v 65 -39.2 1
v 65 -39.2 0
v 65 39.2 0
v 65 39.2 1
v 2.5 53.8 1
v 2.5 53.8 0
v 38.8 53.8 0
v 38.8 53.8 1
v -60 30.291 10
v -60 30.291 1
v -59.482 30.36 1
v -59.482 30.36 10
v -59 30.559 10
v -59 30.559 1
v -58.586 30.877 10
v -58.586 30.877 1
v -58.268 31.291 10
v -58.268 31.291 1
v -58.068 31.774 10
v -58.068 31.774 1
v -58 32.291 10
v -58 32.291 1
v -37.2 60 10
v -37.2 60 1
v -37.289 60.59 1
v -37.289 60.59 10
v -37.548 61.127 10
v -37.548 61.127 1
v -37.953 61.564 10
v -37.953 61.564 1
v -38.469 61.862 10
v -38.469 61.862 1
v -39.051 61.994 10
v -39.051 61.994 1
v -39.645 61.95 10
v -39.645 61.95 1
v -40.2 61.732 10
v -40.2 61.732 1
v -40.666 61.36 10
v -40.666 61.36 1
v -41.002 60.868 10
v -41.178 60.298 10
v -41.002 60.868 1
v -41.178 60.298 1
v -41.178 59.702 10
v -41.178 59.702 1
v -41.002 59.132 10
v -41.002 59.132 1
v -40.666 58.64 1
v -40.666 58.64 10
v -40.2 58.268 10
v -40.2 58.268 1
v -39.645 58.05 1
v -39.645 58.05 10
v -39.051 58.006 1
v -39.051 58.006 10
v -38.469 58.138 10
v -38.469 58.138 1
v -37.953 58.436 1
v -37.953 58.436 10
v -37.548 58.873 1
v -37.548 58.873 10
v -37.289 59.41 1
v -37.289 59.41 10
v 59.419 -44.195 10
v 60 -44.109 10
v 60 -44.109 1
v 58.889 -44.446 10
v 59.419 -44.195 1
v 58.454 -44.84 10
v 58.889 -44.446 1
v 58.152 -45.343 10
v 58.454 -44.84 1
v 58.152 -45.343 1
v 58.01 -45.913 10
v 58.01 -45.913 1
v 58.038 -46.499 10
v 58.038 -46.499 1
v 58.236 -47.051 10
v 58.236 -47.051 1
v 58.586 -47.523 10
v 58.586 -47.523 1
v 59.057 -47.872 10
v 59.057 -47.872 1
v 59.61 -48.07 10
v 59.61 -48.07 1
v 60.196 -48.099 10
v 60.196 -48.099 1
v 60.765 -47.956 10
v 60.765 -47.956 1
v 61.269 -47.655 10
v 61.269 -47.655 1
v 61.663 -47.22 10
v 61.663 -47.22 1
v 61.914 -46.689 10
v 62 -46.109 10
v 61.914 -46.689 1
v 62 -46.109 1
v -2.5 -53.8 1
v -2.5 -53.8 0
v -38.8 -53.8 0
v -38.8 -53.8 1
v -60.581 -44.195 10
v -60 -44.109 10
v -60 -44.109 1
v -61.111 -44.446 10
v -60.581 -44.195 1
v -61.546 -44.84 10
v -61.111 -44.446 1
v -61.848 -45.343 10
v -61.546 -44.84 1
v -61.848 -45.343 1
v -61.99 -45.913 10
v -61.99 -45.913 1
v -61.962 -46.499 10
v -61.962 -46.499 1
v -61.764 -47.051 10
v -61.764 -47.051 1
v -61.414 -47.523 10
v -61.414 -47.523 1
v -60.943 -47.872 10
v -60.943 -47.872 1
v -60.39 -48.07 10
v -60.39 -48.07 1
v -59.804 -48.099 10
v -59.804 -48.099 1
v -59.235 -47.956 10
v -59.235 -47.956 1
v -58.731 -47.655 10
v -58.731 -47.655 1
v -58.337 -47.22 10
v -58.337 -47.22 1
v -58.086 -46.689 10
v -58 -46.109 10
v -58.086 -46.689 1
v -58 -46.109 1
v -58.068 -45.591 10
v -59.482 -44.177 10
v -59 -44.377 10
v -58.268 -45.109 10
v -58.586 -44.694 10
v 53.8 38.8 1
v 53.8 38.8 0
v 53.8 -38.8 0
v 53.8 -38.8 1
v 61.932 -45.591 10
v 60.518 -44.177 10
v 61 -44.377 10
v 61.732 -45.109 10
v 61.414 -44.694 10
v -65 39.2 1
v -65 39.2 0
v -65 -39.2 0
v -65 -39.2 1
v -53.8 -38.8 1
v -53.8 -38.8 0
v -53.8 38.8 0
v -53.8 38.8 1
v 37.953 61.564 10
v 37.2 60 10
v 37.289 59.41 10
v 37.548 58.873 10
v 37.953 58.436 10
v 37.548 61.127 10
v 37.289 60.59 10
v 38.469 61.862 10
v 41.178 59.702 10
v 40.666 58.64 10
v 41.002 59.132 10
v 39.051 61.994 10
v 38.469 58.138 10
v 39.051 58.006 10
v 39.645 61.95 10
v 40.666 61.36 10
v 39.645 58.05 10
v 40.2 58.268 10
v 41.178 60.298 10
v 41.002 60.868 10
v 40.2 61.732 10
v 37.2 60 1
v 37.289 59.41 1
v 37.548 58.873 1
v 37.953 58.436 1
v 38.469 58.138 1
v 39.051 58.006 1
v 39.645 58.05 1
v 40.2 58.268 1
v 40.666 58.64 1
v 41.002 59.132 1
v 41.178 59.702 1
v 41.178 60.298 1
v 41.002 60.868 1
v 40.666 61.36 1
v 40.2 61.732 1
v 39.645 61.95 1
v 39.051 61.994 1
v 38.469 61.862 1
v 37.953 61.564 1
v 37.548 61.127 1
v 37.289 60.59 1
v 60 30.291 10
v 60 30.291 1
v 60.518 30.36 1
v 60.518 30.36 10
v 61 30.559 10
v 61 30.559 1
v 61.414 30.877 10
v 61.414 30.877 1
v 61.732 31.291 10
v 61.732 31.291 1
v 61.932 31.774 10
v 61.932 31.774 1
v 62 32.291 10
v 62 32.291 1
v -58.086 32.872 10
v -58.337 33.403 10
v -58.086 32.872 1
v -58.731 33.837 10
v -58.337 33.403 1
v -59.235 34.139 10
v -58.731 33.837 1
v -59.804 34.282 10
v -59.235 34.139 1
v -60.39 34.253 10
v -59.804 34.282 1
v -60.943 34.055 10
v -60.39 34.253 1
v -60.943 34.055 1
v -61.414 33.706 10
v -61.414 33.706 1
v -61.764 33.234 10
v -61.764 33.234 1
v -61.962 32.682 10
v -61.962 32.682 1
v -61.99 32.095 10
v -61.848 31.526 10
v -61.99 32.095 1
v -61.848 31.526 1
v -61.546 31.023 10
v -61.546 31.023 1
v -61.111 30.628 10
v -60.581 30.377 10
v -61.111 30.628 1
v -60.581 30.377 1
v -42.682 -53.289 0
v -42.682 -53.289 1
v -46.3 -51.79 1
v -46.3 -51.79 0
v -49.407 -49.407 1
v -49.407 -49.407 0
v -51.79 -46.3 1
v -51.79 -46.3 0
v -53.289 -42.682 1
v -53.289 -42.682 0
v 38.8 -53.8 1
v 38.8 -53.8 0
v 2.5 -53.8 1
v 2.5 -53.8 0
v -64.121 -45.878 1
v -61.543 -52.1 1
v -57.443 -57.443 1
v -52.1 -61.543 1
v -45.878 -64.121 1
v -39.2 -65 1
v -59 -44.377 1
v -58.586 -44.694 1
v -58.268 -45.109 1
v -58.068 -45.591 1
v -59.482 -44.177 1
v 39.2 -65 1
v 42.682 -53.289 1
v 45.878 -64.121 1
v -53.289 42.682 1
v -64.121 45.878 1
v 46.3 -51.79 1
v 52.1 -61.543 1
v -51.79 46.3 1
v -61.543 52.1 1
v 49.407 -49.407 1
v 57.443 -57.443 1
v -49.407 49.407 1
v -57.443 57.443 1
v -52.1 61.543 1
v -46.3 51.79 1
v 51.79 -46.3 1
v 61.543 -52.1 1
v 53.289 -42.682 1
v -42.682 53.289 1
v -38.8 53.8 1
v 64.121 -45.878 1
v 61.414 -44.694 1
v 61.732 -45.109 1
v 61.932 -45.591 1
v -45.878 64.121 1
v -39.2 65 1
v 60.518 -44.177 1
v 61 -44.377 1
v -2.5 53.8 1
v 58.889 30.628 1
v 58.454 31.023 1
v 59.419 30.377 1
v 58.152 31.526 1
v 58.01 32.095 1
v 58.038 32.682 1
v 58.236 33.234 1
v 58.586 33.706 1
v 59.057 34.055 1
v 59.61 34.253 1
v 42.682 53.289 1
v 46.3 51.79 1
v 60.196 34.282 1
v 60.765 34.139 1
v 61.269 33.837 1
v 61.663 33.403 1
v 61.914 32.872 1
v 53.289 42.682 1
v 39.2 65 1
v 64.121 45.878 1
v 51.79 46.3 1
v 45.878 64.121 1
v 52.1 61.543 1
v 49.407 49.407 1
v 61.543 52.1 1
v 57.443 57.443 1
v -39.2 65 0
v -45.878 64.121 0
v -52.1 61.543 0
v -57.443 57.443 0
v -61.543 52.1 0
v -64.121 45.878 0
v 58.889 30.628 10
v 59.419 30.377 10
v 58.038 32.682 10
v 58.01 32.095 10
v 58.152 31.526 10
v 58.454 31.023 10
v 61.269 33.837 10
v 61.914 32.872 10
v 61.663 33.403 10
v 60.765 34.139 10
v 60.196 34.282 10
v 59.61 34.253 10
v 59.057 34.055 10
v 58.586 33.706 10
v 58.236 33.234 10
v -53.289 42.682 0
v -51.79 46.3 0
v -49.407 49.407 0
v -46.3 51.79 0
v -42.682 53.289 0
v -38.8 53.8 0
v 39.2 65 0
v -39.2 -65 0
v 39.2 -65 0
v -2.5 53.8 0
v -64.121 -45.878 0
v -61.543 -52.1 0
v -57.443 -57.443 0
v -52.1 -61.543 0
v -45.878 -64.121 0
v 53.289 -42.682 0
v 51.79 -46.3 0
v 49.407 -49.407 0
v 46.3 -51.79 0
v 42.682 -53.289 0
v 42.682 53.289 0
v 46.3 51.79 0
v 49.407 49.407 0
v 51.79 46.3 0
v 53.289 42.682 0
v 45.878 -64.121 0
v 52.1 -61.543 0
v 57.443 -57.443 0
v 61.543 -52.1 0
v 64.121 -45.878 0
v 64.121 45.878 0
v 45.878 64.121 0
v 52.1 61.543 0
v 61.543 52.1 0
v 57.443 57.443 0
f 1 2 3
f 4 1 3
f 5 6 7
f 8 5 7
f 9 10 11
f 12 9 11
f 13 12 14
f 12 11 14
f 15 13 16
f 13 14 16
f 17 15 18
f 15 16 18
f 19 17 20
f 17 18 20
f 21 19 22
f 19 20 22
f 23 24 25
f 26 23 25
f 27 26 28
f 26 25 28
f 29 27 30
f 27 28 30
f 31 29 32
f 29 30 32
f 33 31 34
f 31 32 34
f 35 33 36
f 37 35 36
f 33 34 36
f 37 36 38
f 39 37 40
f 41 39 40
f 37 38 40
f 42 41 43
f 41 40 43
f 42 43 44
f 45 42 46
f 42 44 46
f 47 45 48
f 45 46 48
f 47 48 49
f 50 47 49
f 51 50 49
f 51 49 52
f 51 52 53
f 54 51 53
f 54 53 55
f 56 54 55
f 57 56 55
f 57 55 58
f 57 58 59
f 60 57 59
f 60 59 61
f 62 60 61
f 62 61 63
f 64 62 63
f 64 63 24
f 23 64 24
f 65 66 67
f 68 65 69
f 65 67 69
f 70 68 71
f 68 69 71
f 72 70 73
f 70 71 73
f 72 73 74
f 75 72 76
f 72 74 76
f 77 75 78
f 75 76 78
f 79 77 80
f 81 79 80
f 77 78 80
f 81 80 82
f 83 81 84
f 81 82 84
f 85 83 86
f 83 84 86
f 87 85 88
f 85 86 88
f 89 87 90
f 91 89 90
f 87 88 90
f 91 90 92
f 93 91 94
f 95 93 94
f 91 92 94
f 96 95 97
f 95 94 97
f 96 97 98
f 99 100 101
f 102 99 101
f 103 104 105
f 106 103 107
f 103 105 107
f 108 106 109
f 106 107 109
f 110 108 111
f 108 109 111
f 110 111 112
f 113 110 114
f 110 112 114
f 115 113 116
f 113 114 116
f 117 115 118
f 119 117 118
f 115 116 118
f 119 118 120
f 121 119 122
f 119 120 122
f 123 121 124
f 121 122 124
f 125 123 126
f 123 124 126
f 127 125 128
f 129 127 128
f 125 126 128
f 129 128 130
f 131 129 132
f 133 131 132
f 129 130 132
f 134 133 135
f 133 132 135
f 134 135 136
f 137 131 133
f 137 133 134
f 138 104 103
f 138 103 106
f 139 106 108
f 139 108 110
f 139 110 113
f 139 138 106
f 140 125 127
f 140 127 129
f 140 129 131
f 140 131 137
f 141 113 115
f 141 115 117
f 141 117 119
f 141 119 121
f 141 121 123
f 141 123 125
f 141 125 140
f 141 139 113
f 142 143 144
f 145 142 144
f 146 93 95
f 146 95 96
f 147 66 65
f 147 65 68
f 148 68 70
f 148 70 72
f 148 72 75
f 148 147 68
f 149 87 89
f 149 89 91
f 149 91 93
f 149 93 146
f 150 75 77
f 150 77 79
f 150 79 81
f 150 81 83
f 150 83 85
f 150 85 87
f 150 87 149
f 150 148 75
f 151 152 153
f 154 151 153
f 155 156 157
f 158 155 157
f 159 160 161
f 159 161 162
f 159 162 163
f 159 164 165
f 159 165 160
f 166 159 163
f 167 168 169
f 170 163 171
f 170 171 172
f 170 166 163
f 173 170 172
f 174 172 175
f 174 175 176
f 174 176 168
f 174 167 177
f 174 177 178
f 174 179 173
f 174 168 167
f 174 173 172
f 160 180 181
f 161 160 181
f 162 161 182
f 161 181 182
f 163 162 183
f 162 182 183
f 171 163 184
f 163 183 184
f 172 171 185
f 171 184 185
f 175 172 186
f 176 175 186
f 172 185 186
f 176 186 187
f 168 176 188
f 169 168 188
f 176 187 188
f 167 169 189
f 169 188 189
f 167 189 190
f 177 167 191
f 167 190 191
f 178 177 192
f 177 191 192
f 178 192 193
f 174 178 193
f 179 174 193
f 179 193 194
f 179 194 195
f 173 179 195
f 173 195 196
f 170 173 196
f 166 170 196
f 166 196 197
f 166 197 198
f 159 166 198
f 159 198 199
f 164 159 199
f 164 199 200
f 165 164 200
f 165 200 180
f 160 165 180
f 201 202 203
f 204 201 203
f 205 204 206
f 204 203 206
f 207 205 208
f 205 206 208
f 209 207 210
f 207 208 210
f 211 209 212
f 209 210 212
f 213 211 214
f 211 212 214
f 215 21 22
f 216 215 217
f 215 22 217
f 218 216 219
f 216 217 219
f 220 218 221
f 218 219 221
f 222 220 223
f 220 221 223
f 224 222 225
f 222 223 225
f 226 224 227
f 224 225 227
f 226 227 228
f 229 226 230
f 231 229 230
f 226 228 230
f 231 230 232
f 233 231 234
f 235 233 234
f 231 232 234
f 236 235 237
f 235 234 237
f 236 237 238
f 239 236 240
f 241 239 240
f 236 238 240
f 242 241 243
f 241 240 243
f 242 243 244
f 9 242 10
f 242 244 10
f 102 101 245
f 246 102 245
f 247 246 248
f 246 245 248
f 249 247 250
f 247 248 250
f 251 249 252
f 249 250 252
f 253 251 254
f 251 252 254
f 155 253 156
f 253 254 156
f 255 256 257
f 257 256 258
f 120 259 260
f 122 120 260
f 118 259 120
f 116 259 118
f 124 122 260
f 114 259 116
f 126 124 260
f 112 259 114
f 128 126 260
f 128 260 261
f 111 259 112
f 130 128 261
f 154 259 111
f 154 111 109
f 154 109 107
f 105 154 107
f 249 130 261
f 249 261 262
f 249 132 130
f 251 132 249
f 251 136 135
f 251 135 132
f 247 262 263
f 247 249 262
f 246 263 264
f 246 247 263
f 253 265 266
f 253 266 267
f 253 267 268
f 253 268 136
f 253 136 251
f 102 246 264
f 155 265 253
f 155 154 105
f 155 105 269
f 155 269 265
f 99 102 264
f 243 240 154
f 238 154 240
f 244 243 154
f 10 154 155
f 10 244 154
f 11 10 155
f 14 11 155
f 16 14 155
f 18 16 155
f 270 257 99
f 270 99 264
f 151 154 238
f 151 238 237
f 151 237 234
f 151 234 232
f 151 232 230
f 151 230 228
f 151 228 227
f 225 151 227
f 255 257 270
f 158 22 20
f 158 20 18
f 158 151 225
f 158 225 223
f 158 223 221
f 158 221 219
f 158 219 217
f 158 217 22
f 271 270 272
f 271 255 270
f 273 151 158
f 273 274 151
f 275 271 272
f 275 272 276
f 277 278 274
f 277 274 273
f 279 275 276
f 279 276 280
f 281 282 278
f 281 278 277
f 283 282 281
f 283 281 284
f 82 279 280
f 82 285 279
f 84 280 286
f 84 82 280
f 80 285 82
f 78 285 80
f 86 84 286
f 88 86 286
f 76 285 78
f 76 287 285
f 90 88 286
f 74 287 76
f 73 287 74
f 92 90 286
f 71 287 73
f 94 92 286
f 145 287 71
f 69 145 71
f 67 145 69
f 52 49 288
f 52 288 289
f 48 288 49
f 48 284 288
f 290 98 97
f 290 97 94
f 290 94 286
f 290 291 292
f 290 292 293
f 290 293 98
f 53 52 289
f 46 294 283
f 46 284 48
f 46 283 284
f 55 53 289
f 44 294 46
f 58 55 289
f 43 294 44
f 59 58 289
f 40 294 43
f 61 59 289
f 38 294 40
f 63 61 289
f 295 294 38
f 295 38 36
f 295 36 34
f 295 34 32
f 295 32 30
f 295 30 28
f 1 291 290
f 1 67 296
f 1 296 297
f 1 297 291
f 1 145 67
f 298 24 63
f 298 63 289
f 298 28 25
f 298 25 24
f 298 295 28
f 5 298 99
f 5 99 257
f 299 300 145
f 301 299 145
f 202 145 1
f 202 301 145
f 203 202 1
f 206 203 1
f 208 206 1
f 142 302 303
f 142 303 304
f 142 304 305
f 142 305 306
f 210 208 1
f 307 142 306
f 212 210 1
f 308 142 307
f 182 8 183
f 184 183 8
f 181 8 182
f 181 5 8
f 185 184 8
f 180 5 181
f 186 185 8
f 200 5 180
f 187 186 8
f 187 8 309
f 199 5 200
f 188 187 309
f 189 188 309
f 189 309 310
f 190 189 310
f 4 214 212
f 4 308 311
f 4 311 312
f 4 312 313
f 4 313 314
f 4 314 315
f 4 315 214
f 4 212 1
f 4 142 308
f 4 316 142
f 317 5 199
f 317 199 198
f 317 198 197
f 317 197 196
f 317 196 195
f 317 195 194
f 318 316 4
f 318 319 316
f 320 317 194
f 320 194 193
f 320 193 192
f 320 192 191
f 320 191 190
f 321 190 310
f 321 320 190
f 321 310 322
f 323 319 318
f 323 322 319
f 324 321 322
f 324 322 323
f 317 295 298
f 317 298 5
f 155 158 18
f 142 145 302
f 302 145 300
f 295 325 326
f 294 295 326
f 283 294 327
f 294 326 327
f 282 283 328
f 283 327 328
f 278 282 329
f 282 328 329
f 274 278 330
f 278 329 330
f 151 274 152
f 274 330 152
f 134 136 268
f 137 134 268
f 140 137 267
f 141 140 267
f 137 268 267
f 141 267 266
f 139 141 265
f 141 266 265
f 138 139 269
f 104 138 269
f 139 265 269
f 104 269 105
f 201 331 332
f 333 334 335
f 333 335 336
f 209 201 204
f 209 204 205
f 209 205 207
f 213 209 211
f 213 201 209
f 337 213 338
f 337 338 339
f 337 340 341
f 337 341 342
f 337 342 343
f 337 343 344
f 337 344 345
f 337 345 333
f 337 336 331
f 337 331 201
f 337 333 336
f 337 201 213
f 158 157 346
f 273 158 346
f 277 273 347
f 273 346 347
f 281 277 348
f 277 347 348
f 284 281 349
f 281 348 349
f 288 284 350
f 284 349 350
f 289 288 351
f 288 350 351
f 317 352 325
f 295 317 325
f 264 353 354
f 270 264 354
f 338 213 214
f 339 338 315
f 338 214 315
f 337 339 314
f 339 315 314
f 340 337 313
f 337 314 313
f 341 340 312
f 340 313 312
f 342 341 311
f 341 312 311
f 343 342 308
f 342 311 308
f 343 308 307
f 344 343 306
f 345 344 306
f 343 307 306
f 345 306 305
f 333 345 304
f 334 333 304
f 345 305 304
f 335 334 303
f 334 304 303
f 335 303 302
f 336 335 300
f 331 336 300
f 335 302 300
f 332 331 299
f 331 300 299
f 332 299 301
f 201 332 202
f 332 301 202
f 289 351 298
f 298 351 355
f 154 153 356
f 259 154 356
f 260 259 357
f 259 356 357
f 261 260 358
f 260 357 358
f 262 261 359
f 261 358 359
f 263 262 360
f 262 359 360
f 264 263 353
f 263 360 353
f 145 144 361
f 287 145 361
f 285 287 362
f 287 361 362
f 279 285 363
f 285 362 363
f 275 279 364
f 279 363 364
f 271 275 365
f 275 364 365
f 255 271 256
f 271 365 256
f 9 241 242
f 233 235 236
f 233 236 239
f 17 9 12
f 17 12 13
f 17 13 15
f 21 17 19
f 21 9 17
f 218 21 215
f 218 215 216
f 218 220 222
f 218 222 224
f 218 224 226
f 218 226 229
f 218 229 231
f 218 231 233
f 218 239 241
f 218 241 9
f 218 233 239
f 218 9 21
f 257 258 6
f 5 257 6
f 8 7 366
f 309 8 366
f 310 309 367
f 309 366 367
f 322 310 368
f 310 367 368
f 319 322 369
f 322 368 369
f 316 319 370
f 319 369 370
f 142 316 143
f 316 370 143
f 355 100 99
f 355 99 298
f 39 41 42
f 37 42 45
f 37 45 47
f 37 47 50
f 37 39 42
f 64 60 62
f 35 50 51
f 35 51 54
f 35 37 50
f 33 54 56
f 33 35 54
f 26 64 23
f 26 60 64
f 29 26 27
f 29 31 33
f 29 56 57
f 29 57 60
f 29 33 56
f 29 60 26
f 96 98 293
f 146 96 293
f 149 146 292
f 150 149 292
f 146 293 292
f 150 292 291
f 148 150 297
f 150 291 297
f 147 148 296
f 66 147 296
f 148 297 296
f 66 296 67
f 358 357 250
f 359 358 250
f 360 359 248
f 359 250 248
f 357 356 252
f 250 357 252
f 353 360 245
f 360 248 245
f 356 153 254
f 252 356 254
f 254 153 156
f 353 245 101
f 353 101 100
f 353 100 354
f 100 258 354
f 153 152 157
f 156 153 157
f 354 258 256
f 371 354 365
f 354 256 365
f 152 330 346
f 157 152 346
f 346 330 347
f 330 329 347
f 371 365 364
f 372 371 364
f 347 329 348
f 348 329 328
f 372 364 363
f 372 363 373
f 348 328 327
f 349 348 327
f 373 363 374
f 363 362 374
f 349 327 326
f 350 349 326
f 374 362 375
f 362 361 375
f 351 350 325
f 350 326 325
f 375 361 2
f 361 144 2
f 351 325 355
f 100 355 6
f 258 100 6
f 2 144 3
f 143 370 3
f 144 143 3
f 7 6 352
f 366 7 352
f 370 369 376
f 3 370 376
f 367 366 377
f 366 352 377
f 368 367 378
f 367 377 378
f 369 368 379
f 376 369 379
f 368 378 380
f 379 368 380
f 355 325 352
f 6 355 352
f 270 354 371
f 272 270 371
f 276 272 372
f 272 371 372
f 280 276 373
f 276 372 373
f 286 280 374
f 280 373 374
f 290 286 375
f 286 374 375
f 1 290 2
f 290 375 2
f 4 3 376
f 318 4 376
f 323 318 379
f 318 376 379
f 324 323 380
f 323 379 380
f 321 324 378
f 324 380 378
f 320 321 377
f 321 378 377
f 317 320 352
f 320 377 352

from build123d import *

# Parameters (mm, degrees)
F0_R     = 2
F0_W     = 2.6
F0_H     = 107.6
F0_W_2   = 1.2
F0_H_2   = 1.2
F1_DEPTH = 1
F2_DEPTH = 10


with BuildPart() as f1:
    # F0 (on Top) → F1 (new body)
    with BuildSketch(Plane.XY):
        with BuildLine():
            ThreePointArc((65, 39.2), (57.4433549546, 57.4433549546), (39.2, 65))
            Line((39.2, 65), (-39.2, 65))
            ThreePointArc((-39.2, 65), (-57.4433549546, 57.4433549546), (-65, 39.2))
            Line((-65, 39.2), (-65, -39.2))
            ThreePointArc((-65, -39.2), (-57.4433549546, -57.4433549546), (-39.2, -65))
            Line((-39.2, -65), (39.2, -65))
            ThreePointArc((39.2, -65), (57.4433549546, -57.4433549546), (65, -39.2))
            Line((65, -39.2), (65, 39.2))
        make_face()
        with BuildLine():
            ThreePointArc((-58, -46.1086357947), (-61.4142135624, -47.5228493571), (-60, -44.1086357947))
            ThreePointArc((-60, -44.1086357947), (-58.5857864376, -44.6944222324), (-58, -46.1086357947))
        make_face(mode=Mode.SUBTRACT)
        with BuildLine():
            ThreePointArc((62, -46.1086357947), (58.5857864376, -47.5228493571), (60, -44.1086357947))
            ThreePointArc((60, -44.1086357947), (61.4142135624, -44.6944222324), (62, -46.1086357947))
        make_face(mode=Mode.SUBTRACT)
        with BuildLine():
            ThreePointArc((-58, 32.2913642053), (-58.5857864376, 30.8771506429), (-60, 30.2913642053))
            ThreePointArc((-60, 30.2913642053), (-61.4142135624, 33.7055777676), (-58, 32.2913642053))
        make_face(mode=Mode.SUBTRACT)
        with Locations((-39.2, 60)):
            Circle(F0_R, mode=Mode.SUBTRACT)
        with BuildLine():
            ThreePointArc((-55, 39.2), (-50.3722871427, 50.3722871427), (-39.2, 55))
            Line((-39.2, 55), (-2.5, 55))
            Line((-2.5, 55), (-1.3, 55))
            Line((-1.3, 55), (1.3, 55))
            Line((1.3, 55), (2.5, 55))
            Line((2.5, 55), (39.2, 55))
            ThreePointArc((39.2, 55), (50.3722871427, 50.3722871427), (55, 39.2))
            Line((55, 39.2), (55, -39.2))
            ThreePointArc((55, -39.2), (50.3722871427, -50.3722871427), (39.2, -55))
            Line((39.2, -55), (2.5, -55))
            Line((2.5, -55), (1.3, -55))
            Line((1.3, -55), (-1.3, -55))
            Line((-1.3, -55), (-2.5, -55))
            Line((-2.5, -55), (-39.2, -55))
            ThreePointArc((-39.2, -55), (-50.3722871427, -50.3722871427), (-55, -39.2))
            Line((-55, -39.2), (-55, 39.2))
        make_face(mode=Mode.SUBTRACT)
        with BuildLine():
            ThreePointArc((62, 32.2913642053), (61.4142135624, 30.8771506429), (60, 30.2913642053))
            ThreePointArc((60, 30.2913642053), (58.5857864376, 33.7055777676), (62, 32.2913642053))
        make_face(mode=Mode.SUBTRACT)
        with BuildLine():
            ThreePointArc((41.2, 60), (39.2, 58), (37.2, 60))
            ThreePointArc((37.2, 60), (39.2, 62), (41.2, 60))
        make_face(mode=Mode.SUBTRACT)
        Rectangle(F0_W, F0_H)
        with BuildLine():
            Line((-2.5, 55), (-39.2, 55))
            ThreePointArc((-39.2, 55), (-50.3722871427, 50.3722871427), (-55, 39.2))
            Line((-55, 39.2), (-55, -39.2))
            ThreePointArc((-55, -39.2), (-50.3722871427, -50.3722871427), (-39.2, -55))
            Line((-39.2, -55), (-2.5, -55))
            Line((-2.5, -55), (-2.5, -53.8))
            Line((-2.5, -53.8), (-38.8, -53.8))
            ThreePointArc((-38.8, -53.8), (-49.4066017178, -49.4066017178), (-53.8, -38.8))
            Line((-53.8, -38.8), (-53.8, 38.8))
            ThreePointArc((-53.8, 38.8), (-49.4066017178, 49.4066017178), (-38.8, 53.8))
            Line((-38.8, 53.8), (-2.5, 53.8))
            Line((-2.5, 53.8), (-2.5, 55))
        make_face()
        with BuildLine():
            Line((39.2, 55), (2.5, 55))
            Line((2.5, 55), (2.5, 53.8))
            Line((2.5, 53.8), (38.8, 53.8))
            ThreePointArc((38.8, 53.8), (49.4066017178, 49.4066017178), (53.8, 38.8))
            Line((53.8, 38.8), (53.8, -38.8))
            ThreePointArc((53.8, -38.8), (49.4066017178, -49.4066017178), (38.8, -53.8))
            Line((38.8, -53.8), (2.5, -53.8))
            Line((2.5, -53.8), (2.5, -55))
            Line((2.5, -55), (39.2, -55))
            ThreePointArc((39.2, -55), (50.3722871427, -50.3722871427), (55, -39.2))
            Line((55, -39.2), (55, 39.2))
            ThreePointArc((55, 39.2), (50.3722871427, 50.3722871427), (39.2, 55))
        make_face()
        with Locations((-1.9, 0)):
            Rectangle(F0_W_2, F0_H)
        with Locations((1.9, 0)):
            Rectangle(F0_W_2, F0_H)
        with BuildLine():
            ThreePointArc((-58, -46.1086357947), (-58.5857864376, -44.6944222324), (-60, -44.1086357947))
            ThreePointArc((-60, -44.1086357947), (-61.4142135624, -47.5228493571), (-58, -46.1086357947))
        make_face()
        with BuildLine():
            ThreePointArc((-58, 32.2913642053), (-61.4142135624, 33.7055777676), (-60, 30.2913642053))
            ThreePointArc((-60, 30.2913642053), (-58.5857864376, 30.8771506429), (-58, 32.2913642053))
        make_face()
        with Locations((-39.2, 60)):
            Circle(F0_R)
        with BuildLine():
            ThreePointArc((41.2, 60), (39.2, 62), (37.2, 60))
            ThreePointArc((37.2, 60), (39.2, 58), (41.2, 60))
        make_face()
        with BuildLine():
            ThreePointArc((62, 32.2913642053), (58.5857864376, 33.7055777676), (60, 30.2913642053))
            ThreePointArc((60, 30.2913642053), (61.4142135624, 30.8771506429), (62, 32.2913642053))
        make_face()
        with BuildLine():
            ThreePointArc((62, -46.1086357947), (61.4142135624, -44.6944222324), (60, -44.1086357947))
            ThreePointArc((60, -44.1086357947), (58.5857864376, -47.5228493571), (62, -46.1086357947))
        make_face()
        with Locations((0, -54.4)):
            Rectangle(F0_W, F0_H_2)
        with Locations((0, 54.4)):
            Rectangle(F0_W, F0_H_2)
        with Locations((-1.9, -54.4)):
            Rectangle(F0_W_2, F0_H_2)
        with Locations((1.9, -54.4)):
            Rectangle(F0_W_2, F0_H_2)
        with Locations((-1.9, 54.4)):
            Rectangle(F0_W_2, F0_H_2)
        with Locations((1.9, 54.4)):
            Rectangle(F0_W_2, F0_H_2)
    extrude(amount=F1_DEPTH)

    # F0 (on Top) → F2 (join)
    with BuildSketch(Plane.XY):
        with BuildLine():
            ThreePointArc((-58, -46.1086357947), (-58.5857864376, -44.6944222324), (-60, -44.1086357947))
            ThreePointArc((-60, -44.1086357947), (-61.4142135624, -47.5228493571), (-58, -46.1086357947))
        make_face()
        with BuildLine():
            ThreePointArc((-58, 32.2913642053), (-61.4142135624, 33.7055777676), (-60, 30.2913642053))
            ThreePointArc((-60, 30.2913642053), (-58.5857864376, 30.8771506429), (-58, 32.2913642053))
        make_face()
        with BuildLine():
            ThreePointArc((41.2, 60), (39.2, 62), (37.2, 60))
            ThreePointArc((37.2, 60), (39.2, 58), (41.2, 60))
        make_face()
        with Locations((-39.2, 60)):
            Circle(F0_R)
        with BuildLine():
            ThreePointArc((62, -46.1086357947), (61.4142135624, -44.6944222324), (60, -44.1086357947))
            ThreePointArc((60, -44.1086357947), (58.5857864376, -47.5228493571), (62, -46.1086357947))
        make_face()
        with BuildLine():
            ThreePointArc((62, 32.2913642053), (58.5857864376, 33.7055777676), (60, 30.2913642053))
            ThreePointArc((60, 30.2913642053), (61.4142135624, 30.8771506429), (62, 32.2913642053))
        make_face()
    extrude(amount=F2_DEPTH)


solid = f1.part
